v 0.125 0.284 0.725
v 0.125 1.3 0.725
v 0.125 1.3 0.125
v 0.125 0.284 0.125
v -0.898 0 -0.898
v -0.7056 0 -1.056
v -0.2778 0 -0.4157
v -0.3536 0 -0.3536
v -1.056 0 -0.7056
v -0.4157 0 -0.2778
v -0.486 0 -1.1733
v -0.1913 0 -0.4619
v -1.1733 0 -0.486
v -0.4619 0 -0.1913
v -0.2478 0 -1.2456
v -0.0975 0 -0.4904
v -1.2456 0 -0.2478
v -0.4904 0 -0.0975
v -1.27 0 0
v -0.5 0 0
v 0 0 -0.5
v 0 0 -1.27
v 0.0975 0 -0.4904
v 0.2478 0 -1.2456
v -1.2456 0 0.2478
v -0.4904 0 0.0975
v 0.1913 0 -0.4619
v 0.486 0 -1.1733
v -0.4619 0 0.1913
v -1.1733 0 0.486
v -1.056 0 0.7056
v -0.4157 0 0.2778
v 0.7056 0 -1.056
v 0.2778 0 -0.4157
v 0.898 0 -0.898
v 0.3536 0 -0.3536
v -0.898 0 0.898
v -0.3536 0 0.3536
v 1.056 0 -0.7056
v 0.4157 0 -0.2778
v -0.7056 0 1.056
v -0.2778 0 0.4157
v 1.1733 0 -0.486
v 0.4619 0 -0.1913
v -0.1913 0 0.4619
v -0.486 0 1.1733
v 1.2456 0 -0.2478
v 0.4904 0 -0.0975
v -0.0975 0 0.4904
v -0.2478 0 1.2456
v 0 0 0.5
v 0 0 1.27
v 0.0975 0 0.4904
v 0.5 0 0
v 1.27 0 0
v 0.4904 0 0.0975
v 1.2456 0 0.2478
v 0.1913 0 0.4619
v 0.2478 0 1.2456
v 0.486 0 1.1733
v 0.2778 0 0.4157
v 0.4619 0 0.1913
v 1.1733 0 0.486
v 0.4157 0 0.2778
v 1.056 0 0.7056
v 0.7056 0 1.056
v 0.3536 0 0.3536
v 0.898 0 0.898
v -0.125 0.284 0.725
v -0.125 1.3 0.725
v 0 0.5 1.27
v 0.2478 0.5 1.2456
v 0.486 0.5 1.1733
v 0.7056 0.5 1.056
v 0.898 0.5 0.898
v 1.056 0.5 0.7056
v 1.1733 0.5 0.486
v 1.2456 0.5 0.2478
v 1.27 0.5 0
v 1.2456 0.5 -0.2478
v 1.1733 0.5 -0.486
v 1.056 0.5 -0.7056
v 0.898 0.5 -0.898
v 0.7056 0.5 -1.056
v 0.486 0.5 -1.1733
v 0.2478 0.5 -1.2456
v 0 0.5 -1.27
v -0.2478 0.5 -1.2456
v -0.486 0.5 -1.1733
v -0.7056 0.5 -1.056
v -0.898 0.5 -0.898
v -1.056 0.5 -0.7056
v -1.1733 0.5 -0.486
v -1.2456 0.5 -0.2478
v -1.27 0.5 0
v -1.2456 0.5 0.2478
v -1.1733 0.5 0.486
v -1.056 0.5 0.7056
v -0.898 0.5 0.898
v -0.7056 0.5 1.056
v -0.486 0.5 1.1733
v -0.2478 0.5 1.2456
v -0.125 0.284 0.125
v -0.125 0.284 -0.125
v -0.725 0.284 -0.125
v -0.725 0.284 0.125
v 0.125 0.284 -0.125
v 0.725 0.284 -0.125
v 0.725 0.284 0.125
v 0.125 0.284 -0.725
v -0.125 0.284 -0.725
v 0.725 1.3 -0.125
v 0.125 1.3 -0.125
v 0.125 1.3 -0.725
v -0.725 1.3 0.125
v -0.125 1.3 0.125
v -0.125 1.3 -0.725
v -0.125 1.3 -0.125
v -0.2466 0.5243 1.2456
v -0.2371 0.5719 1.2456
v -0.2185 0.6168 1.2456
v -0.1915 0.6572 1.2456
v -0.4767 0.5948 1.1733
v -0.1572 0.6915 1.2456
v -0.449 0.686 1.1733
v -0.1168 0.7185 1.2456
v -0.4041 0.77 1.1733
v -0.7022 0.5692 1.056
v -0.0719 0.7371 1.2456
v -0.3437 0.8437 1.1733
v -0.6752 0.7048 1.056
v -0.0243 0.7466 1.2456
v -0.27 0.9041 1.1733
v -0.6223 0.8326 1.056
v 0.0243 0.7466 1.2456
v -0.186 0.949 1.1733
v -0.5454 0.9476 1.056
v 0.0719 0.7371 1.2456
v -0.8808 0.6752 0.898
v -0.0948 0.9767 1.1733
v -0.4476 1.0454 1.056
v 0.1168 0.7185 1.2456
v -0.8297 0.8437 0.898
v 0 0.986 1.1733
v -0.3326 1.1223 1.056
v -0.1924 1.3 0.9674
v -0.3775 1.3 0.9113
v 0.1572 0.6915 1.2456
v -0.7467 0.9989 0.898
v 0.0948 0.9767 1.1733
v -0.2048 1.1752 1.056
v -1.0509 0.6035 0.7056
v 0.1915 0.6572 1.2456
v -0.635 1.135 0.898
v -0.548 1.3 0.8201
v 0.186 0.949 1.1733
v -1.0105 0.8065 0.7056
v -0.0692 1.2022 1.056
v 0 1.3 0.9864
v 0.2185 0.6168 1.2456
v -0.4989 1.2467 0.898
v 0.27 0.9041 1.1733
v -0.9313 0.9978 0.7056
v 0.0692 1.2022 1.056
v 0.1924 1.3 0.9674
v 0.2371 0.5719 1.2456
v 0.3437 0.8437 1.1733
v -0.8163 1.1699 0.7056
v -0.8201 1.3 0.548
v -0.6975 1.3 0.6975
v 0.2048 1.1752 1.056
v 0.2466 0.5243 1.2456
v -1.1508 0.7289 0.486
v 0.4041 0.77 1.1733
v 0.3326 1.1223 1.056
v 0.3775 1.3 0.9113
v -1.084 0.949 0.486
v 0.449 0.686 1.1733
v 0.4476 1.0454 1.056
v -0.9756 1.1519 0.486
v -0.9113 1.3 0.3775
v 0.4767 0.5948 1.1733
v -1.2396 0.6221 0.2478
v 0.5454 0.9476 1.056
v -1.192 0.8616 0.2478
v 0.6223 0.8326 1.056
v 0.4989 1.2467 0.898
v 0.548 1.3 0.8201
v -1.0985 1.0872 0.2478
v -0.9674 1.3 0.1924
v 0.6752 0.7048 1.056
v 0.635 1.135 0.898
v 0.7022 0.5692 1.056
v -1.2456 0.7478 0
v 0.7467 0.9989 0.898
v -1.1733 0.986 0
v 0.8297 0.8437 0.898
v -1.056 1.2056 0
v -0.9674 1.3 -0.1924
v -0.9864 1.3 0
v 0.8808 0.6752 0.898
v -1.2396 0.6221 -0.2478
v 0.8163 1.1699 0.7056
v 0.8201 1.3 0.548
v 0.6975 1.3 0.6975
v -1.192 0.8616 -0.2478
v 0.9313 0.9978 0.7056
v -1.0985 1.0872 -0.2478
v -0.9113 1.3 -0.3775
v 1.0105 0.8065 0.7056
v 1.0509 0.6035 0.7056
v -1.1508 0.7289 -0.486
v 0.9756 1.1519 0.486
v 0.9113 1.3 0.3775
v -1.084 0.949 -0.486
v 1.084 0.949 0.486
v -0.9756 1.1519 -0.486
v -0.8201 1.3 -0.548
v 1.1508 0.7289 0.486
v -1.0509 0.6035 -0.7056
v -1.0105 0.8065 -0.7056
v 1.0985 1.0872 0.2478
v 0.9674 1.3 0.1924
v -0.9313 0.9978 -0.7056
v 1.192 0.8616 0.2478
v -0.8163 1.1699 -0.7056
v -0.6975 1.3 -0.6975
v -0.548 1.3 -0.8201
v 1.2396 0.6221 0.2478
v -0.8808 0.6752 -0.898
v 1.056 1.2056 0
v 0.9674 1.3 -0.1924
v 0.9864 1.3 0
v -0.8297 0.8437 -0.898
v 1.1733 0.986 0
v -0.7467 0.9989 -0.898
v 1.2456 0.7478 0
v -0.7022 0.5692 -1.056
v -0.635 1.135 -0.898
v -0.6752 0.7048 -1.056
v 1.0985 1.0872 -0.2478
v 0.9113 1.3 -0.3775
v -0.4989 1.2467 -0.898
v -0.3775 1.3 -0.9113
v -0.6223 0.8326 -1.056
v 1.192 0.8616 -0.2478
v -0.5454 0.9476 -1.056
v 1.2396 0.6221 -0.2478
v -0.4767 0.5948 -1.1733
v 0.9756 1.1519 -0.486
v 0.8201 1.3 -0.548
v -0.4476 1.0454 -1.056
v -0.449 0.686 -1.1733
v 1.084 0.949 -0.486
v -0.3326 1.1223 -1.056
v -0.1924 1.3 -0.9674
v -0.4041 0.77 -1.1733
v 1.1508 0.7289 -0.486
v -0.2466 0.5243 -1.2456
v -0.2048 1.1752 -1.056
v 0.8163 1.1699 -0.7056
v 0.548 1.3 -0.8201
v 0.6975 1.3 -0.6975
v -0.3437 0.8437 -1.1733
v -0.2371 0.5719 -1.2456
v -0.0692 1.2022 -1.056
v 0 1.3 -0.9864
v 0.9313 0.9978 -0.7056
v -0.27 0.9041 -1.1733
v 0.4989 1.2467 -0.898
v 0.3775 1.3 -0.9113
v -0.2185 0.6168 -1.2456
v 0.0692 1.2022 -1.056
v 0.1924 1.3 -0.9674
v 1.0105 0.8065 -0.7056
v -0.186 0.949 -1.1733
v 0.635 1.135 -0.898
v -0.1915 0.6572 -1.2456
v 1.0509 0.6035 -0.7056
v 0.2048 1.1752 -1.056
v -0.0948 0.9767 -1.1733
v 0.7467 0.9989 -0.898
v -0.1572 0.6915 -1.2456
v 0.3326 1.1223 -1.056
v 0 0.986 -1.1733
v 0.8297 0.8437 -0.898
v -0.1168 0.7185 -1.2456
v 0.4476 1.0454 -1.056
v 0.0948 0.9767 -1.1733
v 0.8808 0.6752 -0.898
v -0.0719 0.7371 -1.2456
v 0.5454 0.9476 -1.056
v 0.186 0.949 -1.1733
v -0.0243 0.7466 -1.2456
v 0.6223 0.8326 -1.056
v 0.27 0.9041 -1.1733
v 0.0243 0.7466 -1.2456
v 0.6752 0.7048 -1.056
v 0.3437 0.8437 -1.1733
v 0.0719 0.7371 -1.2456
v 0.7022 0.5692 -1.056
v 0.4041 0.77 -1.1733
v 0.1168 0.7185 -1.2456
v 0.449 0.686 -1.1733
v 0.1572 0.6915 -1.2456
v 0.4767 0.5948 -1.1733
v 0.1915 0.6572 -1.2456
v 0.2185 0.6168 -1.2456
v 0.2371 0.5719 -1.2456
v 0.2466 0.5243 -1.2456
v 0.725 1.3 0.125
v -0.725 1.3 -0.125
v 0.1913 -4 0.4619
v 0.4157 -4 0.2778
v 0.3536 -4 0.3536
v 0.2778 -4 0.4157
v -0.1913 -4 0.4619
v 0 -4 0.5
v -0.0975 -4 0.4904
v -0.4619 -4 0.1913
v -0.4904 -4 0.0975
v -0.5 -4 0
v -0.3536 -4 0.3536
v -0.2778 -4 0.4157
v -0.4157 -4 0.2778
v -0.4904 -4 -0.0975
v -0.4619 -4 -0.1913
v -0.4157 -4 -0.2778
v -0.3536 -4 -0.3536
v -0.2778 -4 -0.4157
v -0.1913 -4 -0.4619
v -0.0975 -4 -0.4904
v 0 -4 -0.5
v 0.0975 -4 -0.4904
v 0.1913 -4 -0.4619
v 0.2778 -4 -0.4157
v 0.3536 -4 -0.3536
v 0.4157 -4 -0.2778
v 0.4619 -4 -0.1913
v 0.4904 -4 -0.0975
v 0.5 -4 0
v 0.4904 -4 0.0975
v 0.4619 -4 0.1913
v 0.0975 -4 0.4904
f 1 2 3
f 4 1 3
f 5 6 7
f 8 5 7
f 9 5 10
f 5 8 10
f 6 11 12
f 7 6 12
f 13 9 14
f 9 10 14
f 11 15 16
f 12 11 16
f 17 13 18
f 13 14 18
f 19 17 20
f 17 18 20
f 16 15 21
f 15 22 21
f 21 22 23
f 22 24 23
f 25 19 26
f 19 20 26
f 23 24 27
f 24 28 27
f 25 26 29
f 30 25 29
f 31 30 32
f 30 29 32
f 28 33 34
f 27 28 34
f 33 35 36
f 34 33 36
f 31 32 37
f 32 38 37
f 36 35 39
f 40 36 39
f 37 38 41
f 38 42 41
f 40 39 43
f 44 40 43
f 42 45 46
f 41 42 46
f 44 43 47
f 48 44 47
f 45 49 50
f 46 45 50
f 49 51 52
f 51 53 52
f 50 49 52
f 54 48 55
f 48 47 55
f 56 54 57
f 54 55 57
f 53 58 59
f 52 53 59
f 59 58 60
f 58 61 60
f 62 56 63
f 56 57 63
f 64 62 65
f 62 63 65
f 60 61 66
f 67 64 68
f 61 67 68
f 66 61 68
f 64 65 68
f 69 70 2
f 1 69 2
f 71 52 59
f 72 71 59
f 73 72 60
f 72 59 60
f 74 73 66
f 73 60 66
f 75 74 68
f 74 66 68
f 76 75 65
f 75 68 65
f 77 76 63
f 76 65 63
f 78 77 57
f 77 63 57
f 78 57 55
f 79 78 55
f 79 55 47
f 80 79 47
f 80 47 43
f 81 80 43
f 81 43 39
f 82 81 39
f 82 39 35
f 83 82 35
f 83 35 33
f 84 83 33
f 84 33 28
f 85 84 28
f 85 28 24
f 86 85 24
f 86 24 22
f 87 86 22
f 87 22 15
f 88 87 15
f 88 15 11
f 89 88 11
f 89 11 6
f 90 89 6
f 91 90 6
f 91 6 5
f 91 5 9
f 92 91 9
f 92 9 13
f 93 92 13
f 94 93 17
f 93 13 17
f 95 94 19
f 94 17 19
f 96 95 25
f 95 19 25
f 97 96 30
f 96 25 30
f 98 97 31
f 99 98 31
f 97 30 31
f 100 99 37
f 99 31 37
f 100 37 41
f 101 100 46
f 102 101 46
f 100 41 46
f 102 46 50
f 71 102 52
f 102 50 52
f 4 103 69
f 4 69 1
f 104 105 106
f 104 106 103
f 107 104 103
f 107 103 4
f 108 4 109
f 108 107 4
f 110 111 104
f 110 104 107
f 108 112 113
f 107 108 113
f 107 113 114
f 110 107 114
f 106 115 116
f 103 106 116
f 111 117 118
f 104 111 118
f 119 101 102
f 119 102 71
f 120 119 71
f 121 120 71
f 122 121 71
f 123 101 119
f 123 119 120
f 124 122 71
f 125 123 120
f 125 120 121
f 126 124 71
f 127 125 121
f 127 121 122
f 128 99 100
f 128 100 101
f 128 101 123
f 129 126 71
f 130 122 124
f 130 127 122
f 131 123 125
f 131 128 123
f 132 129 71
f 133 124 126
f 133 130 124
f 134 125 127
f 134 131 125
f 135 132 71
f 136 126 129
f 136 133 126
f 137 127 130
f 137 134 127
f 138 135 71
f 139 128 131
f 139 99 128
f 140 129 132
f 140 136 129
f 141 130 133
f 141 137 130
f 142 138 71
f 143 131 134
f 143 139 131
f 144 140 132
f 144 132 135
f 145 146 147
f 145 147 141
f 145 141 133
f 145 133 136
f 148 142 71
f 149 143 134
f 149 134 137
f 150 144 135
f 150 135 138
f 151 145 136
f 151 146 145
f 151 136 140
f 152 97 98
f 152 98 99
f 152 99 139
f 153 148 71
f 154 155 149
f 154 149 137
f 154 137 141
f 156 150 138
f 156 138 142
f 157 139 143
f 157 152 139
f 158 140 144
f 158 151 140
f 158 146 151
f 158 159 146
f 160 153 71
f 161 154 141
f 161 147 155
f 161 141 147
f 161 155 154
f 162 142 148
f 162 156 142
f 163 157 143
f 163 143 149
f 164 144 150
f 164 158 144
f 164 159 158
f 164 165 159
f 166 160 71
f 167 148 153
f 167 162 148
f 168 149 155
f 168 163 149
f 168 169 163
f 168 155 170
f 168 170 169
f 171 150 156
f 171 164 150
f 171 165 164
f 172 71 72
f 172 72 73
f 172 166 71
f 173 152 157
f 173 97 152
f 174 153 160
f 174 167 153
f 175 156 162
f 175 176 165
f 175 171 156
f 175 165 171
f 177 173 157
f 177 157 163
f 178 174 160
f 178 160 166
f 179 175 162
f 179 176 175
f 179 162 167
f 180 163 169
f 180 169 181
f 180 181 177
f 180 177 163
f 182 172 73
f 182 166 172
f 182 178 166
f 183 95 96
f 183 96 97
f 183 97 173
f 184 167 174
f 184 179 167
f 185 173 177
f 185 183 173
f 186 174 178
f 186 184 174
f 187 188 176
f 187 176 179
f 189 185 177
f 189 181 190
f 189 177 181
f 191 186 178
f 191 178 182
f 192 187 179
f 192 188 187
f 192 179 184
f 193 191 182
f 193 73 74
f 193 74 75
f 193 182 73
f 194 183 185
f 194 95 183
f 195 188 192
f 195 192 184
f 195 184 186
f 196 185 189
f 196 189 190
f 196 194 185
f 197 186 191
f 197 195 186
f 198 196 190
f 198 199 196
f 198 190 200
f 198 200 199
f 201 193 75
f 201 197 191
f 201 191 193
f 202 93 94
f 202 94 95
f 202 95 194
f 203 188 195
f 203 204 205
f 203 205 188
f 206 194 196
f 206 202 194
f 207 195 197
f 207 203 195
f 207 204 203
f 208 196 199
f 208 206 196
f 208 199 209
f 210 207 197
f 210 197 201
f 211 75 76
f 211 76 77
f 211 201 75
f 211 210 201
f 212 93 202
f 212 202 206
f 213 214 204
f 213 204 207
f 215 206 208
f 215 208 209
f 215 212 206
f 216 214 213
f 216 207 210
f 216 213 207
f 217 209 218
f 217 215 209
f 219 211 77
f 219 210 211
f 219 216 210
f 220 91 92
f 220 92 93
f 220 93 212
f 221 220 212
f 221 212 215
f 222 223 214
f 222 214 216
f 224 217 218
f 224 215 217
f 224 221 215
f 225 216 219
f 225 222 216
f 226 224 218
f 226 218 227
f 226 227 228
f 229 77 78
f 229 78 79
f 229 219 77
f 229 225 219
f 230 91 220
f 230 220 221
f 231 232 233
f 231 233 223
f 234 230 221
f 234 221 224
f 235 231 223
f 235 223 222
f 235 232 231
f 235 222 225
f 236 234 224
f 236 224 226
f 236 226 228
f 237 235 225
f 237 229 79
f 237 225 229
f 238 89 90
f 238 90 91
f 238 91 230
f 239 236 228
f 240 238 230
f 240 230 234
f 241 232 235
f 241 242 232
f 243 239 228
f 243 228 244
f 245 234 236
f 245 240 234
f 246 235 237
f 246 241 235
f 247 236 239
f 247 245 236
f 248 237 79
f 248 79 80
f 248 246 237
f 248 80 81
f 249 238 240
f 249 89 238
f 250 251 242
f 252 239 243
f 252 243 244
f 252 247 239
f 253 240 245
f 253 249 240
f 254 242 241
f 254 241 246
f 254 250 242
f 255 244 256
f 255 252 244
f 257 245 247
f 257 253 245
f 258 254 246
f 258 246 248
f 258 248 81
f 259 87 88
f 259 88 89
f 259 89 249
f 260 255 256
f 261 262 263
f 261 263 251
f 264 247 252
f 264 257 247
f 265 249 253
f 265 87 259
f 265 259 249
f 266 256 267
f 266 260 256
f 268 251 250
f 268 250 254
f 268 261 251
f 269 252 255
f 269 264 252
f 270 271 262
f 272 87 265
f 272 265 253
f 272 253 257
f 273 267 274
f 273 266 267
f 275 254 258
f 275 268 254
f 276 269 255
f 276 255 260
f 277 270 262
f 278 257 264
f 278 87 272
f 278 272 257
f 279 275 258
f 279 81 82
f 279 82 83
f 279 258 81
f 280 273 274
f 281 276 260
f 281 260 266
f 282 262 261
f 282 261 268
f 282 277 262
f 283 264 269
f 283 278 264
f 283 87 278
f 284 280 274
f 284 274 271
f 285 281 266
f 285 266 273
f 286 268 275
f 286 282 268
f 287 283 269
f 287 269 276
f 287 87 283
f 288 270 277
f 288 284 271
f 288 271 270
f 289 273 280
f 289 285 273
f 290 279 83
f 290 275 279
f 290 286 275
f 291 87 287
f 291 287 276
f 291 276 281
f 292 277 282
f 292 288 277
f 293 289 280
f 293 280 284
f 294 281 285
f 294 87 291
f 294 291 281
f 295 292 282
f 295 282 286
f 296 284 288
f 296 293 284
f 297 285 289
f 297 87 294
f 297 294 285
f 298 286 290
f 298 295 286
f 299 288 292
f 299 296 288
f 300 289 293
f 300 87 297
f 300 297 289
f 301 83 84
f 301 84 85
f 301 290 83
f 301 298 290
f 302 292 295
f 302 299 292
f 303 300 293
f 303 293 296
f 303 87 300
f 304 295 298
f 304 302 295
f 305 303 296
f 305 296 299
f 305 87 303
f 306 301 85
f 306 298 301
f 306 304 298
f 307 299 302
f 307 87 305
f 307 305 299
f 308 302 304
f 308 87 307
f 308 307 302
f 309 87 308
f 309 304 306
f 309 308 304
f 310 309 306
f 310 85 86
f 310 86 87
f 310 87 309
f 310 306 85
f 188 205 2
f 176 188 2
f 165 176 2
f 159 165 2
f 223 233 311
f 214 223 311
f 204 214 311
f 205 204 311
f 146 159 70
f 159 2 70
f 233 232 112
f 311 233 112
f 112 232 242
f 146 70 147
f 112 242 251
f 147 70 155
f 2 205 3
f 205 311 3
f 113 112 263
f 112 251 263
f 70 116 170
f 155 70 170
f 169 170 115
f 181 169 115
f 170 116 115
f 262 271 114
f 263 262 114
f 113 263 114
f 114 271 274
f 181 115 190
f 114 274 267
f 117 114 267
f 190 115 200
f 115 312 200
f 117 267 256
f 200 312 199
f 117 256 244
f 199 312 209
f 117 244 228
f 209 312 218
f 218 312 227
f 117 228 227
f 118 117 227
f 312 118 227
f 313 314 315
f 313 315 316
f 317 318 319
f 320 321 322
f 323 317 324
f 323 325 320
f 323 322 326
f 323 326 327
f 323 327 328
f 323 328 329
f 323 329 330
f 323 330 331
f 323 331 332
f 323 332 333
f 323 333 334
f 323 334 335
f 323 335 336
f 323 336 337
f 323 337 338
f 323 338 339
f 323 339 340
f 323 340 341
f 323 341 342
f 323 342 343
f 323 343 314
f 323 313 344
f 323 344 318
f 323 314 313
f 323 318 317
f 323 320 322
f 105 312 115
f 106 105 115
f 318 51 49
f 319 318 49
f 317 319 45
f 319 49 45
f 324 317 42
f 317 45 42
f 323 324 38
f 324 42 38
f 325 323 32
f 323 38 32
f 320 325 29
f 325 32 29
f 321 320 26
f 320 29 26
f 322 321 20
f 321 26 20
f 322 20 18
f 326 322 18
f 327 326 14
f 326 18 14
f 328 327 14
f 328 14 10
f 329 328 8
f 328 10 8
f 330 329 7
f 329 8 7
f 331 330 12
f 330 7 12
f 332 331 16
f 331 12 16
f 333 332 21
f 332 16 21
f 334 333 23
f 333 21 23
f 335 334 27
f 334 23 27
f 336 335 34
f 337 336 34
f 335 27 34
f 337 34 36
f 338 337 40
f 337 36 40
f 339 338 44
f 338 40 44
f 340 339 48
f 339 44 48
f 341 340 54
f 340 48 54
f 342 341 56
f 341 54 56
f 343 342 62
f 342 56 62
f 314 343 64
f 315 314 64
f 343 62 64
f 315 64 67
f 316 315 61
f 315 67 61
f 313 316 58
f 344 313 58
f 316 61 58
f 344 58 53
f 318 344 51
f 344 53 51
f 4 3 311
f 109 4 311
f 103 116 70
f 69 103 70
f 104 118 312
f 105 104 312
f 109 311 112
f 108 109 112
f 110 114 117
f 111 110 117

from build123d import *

# Parameters (mm, degrees)
SKETCH1_R           = 1.27
BOSS_EXTRUDE1_DEPTH = 0.5
REVOLVE1_ANGLE      = 180
SKETCH3_R           = 2.5
CUT_EXTRUDE2_DEPTH  = 1.016
CUT_EXTRUDE3_DEPTH  = 1.016
SKETCH6_R           = 0.5
BOSS_EXTRUDE2_DEPTH = 4


with BuildPart() as part:
    # Sketch1 → Boss-Extrude1 (new body)
    with BuildSketch(Plane(origin=(0, 0, 0), x_dir=(1, 0, 0), z_dir=(0, 1, 0))):
        with Locations(Location((0, 0, 0), (0, 0, 270))):
            Circle(SKETCH1_R)
    extrude(amount=BOSS_EXTRUDE1_DEPTH)

    # Sketch2 → Revolve1 (revolve)
    with BuildSketch(Plane(origin=(0, 0.5, 0), x_dir=(1, 0, 0), z_dir=(0, 1, 0))):
        with BuildLine():
            Line((0, 1.27), (0, -1.27))
            ThreePointArc((0, -1.27), (-1.27, 0), (0, 1.27))
        make_face()
    revolve(axis=Axis((0, 0.5, -1.27), (0, 0, -1)), revolution_arc=REVOLVE1_ANGLE)

    # Sketch3 → Cut-Extrude2 (cut)
    with BuildSketch(Plane(origin=(0, 1.3, 0), x_dir=(-1, 0, 0), z_dir=(0, -1, 0))):
        Circle(SKETCH3_R)
    extrude(amount=-CUT_EXTRUDE2_DEPTH, mode=Mode.SUBTRACT)

    # Sketch5 → Cut-Extrude3 (cut)
    with BuildSketch(Plane(origin=(0, 1.3, 0), x_dir=(-1, 0, 0), z_dir=(0, -1, 0))):
        Polygon((0.125, 0.725), (0.125, 0.125), (0.725, 0.125), (0.725, -0.125), (0.125, -0.125), (0.125, -0.725), (-0.125, -0.725), (-0.125, -0.125), (-0.725, -0.125), (-0.725, 0.125), (-0.125, 0.125), (-0.125, 0.725), align=None)
    extrude(amount=CUT_EXTRUDE3_DEPTH, mode=Mode.SUBTRACT)

    # Sketch6 → Boss-Extrude2 (add)
    with BuildSketch(Plane(origin=(0, 0, 0), x_dir=(-1, 0, 0), z_dir=(0, -1, 0))):
        with Locations(Location((0, 0, 0), (0, 0, 270))):
            Circle(SKETCH6_R)
    extrude(amount=BOSS_EXTRUDE2_DEPTH)


solid = part.part
